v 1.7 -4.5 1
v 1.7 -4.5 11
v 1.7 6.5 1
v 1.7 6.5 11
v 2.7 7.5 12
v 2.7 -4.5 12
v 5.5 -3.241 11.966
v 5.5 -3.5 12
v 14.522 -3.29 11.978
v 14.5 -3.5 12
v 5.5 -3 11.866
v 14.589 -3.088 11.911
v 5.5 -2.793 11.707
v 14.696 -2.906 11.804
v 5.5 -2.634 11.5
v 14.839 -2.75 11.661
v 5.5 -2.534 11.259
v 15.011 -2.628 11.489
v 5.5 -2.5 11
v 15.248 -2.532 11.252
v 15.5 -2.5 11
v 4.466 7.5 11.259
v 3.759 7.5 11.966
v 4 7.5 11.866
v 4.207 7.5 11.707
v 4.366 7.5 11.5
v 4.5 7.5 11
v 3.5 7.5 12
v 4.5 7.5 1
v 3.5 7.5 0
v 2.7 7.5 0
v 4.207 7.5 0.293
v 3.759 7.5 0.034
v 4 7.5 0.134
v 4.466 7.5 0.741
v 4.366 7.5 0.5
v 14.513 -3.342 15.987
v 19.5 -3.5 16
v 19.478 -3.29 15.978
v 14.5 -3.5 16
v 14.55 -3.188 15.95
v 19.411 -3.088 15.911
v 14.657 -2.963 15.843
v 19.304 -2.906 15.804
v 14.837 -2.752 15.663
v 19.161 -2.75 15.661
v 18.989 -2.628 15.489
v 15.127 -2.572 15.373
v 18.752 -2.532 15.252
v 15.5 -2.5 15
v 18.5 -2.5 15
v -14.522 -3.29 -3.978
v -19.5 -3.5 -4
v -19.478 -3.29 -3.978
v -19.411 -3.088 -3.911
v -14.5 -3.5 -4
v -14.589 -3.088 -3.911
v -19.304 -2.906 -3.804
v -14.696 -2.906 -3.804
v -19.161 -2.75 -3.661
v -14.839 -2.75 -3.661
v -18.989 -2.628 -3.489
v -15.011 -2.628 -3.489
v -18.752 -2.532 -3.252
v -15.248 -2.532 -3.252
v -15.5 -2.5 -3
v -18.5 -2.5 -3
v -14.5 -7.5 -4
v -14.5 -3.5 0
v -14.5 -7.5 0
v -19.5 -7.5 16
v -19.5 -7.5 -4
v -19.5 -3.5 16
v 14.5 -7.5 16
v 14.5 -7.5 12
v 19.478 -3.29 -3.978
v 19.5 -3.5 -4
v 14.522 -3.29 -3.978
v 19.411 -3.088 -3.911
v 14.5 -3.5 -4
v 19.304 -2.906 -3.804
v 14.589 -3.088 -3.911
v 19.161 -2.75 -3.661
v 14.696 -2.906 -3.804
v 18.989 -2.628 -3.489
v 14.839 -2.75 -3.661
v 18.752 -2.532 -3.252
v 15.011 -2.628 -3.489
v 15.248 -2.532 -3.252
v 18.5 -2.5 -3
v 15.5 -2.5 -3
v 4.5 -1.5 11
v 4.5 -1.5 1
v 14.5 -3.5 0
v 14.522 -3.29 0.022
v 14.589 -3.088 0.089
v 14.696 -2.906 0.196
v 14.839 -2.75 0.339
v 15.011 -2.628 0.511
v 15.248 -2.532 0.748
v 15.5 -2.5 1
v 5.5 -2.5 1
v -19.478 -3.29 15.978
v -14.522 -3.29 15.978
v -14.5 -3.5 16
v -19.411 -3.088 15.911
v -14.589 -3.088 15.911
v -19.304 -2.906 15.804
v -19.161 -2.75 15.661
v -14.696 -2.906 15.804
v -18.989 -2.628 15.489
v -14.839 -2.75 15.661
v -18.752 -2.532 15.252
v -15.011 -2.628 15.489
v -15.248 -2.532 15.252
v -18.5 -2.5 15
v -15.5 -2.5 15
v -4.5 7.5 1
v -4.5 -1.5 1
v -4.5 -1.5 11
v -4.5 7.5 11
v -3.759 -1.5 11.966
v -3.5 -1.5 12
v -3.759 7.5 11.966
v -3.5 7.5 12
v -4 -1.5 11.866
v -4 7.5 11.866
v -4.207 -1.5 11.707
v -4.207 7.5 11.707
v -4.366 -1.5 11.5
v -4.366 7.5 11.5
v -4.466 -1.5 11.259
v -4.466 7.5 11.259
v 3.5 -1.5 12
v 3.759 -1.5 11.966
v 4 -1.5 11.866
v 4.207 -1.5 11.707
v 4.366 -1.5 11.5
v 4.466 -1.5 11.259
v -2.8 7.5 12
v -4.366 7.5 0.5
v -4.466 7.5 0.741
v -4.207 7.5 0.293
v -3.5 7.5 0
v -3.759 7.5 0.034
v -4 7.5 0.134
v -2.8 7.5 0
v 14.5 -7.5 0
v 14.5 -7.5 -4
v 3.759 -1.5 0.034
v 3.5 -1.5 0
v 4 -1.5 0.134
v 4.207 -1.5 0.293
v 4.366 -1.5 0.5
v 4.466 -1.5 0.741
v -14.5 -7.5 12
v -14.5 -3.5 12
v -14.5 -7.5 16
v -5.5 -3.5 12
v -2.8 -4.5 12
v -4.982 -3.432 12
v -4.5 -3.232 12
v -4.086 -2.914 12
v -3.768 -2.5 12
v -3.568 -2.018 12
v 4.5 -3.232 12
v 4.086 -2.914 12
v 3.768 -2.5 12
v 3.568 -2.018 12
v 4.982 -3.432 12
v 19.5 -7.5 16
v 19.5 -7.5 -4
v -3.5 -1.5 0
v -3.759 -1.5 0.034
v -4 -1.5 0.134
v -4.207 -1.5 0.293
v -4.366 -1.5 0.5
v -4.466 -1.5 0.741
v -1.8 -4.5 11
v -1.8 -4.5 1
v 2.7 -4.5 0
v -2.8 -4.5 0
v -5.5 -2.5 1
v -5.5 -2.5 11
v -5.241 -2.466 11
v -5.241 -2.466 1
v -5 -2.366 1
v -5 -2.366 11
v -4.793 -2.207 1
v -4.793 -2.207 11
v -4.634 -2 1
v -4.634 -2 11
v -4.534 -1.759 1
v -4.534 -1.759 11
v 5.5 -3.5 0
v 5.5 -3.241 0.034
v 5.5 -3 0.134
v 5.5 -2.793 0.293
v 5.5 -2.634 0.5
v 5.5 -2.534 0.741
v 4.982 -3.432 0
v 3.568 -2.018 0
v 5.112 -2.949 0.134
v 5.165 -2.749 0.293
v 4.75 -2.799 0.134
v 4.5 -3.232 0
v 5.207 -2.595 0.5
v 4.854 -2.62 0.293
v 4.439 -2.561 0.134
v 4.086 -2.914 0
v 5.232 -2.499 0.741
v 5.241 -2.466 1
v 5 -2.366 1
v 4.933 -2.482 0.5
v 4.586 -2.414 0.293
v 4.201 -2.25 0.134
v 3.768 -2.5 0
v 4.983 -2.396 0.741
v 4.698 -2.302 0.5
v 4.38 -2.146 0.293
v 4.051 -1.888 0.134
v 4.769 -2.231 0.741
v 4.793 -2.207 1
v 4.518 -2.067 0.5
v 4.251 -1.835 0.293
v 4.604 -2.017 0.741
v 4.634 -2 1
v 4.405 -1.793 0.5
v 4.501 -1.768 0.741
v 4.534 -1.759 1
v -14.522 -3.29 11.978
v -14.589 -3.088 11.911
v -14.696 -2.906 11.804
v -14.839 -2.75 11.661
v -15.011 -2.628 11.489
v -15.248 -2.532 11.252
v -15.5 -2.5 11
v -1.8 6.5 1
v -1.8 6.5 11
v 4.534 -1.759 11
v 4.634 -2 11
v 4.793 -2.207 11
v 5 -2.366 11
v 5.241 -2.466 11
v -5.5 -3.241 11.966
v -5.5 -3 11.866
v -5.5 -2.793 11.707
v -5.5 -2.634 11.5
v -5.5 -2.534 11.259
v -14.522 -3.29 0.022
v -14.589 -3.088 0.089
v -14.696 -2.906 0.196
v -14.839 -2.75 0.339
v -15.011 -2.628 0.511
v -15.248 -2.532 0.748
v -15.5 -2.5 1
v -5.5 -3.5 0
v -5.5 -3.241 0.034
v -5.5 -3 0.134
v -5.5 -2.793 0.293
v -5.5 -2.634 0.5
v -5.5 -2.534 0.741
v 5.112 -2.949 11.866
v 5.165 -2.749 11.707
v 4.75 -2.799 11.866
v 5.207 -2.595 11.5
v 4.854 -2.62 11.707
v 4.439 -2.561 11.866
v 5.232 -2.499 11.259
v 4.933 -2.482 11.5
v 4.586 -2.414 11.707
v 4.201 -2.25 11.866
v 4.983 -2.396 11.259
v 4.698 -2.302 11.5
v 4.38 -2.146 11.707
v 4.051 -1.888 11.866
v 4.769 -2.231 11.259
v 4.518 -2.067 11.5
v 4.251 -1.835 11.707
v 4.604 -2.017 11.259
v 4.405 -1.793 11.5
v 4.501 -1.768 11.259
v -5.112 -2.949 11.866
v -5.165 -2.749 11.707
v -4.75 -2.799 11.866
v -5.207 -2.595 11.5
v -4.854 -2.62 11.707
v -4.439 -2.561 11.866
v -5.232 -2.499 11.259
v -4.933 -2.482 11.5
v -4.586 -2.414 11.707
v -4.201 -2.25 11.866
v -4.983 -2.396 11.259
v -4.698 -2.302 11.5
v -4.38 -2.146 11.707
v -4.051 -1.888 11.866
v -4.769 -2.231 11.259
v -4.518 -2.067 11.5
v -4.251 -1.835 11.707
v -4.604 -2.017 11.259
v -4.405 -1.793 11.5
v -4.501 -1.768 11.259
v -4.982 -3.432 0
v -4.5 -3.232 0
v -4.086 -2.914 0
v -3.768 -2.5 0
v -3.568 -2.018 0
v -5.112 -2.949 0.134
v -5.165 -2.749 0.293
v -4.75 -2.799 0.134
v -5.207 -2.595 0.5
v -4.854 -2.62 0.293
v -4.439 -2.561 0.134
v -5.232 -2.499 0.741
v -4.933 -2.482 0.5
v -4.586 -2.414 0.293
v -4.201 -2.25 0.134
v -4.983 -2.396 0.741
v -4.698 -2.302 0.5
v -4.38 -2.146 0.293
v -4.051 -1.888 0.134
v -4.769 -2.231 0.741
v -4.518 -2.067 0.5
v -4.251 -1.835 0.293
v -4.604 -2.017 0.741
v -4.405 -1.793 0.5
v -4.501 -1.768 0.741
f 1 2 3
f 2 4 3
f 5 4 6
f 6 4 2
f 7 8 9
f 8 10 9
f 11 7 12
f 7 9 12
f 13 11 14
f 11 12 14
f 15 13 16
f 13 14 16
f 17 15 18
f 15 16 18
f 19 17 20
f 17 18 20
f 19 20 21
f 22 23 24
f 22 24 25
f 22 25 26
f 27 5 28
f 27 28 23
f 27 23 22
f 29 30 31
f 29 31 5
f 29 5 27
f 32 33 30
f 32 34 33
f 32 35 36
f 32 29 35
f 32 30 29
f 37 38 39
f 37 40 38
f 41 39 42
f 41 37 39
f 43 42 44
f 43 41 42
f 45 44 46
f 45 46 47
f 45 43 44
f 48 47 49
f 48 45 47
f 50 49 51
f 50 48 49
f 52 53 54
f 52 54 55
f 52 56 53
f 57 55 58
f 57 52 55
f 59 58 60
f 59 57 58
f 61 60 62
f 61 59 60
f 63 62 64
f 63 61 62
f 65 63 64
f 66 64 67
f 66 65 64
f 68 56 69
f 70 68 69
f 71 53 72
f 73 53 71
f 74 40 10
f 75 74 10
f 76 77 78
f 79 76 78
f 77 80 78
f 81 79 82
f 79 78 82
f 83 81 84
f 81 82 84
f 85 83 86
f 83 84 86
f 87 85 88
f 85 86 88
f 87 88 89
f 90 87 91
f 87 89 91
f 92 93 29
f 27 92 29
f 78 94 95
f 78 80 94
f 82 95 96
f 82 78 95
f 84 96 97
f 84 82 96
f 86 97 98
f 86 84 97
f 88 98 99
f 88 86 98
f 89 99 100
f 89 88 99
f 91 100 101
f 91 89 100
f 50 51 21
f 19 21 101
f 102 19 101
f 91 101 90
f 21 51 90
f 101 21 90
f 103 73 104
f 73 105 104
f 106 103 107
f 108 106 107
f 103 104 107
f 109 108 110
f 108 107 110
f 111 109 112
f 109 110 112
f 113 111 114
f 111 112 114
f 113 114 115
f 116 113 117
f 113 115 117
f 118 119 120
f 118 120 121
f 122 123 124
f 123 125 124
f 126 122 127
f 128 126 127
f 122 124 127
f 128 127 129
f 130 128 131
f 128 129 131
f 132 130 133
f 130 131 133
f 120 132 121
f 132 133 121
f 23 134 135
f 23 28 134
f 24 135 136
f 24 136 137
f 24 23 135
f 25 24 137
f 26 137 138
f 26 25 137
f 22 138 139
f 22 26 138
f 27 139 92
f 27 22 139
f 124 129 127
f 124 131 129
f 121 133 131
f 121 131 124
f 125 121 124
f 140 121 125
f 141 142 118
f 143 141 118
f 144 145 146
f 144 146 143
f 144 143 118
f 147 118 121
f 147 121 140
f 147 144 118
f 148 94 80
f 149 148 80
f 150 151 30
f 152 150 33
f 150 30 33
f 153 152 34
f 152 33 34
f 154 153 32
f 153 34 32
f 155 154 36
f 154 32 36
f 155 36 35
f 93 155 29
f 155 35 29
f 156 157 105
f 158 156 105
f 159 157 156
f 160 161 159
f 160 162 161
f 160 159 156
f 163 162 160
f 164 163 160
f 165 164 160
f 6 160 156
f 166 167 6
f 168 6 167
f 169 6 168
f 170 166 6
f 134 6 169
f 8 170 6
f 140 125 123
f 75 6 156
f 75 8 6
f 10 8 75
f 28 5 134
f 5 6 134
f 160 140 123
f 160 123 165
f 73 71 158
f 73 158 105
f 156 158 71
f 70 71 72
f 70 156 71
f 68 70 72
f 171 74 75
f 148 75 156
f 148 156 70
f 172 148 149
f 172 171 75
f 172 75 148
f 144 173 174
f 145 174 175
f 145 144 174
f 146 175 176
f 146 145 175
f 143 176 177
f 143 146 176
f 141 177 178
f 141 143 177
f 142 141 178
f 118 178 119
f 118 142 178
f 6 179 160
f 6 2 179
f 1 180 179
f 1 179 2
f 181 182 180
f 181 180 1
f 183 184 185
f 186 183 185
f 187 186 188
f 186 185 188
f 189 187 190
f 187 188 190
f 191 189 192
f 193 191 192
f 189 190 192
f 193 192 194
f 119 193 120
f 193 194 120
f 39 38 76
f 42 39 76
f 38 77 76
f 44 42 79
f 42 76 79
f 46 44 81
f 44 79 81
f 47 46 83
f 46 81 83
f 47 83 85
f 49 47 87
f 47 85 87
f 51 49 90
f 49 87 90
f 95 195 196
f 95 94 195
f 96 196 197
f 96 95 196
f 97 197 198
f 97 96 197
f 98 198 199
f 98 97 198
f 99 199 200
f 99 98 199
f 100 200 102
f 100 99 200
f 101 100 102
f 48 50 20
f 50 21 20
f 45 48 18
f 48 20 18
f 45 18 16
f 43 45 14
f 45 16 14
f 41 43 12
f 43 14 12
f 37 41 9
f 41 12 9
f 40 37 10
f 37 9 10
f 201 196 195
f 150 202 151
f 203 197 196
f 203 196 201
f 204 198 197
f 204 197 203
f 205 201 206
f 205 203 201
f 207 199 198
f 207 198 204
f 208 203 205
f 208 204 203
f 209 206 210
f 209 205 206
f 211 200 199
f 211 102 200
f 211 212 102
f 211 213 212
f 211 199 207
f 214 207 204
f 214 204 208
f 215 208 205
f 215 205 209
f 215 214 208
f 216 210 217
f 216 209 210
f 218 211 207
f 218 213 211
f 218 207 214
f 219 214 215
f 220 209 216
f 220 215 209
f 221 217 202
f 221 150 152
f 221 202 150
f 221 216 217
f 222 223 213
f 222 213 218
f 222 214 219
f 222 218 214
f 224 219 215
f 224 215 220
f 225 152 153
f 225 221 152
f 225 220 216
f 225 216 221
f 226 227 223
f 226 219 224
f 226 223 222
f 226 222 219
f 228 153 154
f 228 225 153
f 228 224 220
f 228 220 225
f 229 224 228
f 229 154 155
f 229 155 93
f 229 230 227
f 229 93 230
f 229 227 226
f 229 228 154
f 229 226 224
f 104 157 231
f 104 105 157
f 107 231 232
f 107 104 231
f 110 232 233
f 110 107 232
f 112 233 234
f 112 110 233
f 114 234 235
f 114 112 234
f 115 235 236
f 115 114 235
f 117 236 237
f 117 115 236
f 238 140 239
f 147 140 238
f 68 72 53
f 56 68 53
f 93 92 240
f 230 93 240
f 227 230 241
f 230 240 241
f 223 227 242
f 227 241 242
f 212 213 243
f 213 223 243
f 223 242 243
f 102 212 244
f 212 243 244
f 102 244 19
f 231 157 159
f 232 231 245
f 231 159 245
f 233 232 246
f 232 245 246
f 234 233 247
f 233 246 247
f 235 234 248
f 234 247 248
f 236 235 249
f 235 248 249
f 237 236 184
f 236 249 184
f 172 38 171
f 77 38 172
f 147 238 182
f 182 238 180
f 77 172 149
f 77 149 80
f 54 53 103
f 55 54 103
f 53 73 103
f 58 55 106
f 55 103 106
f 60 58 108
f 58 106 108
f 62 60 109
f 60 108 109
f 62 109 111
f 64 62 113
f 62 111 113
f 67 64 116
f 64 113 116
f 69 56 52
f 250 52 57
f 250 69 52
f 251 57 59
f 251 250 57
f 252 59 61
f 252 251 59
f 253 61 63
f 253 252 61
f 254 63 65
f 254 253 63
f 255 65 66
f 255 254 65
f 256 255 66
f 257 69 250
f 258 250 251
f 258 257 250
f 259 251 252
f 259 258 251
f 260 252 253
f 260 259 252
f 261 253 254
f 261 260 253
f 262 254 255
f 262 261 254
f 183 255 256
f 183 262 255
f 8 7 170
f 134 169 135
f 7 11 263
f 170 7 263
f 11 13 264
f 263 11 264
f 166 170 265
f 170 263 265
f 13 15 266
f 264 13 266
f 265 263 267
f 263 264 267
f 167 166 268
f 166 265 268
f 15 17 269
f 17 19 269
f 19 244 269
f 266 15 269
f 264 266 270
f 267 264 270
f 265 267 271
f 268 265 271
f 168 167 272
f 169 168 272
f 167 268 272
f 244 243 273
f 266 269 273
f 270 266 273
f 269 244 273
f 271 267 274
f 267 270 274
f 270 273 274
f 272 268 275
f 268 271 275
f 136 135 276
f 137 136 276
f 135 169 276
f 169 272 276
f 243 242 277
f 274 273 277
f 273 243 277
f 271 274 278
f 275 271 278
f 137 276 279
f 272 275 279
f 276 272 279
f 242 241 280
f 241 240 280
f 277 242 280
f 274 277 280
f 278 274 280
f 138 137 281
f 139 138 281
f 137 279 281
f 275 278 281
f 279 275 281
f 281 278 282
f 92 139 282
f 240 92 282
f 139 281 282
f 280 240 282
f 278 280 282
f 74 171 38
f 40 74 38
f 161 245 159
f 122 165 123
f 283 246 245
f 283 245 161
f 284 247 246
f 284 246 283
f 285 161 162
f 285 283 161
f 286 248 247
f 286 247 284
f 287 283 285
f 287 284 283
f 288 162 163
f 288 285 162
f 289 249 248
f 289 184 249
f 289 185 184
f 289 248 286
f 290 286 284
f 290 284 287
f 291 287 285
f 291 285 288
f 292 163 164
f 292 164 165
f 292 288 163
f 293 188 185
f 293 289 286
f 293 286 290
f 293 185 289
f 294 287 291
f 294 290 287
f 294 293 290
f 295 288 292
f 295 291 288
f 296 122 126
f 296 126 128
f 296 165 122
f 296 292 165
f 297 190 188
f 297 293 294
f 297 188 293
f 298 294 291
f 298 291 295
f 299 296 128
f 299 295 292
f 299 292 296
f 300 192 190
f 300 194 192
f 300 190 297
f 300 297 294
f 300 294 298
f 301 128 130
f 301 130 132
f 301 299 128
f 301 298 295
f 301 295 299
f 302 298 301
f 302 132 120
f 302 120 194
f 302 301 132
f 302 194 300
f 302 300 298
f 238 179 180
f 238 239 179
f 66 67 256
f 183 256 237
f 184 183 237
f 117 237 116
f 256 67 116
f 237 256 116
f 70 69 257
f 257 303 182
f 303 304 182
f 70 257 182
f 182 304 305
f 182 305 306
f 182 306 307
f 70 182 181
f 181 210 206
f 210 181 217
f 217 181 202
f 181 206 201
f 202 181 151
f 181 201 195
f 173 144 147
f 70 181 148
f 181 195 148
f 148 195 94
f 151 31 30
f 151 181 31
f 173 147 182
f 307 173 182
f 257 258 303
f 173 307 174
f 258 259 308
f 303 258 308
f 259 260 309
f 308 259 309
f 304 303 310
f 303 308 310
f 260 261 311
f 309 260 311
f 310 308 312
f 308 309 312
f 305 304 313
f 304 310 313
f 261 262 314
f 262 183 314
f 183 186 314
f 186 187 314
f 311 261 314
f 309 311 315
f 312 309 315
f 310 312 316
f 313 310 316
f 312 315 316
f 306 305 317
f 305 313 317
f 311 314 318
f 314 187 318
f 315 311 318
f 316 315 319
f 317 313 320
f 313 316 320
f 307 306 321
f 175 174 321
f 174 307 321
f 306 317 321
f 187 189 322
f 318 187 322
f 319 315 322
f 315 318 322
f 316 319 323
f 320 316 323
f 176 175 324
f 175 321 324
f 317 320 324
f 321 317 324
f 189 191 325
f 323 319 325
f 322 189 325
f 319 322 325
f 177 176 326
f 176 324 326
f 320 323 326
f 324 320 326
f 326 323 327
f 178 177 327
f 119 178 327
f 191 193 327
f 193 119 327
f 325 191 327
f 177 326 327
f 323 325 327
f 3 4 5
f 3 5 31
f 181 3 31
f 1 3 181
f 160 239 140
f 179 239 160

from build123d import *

# Parameters (mm, degrees)
SKETCH1_W           = 9
SKETCH1_H           = 15
SKETCH1_W_2         = 15
SKETCH1_H_2         = 5
BOSS_EXTRUDE1_DEPTH = 12
SKETCH2_W           = 3.5
SKETCH2_H           = 12
CUT_EXTRUDE1_DEPTH  = 12
SKETCH3_W           = 20
SKETCH3_H           = 5
BOSS_EXTRUDE2_DEPTH = 5
SKETCH4_W           = 20
SKETCH4_H           = 5
BOSS_EXTRUDE3_DEPTH = 5
CHAMFER1_SIZE       = 1
FILLET1_R           = 1


with BuildPart() as part:
    # Sketch1 → Boss-Extrude1 (new body)
    with BuildSketch(Plane.XY):
        Rectangle(SKETCH1_W, SKETCH1_H)
        with Locations((-12, -5)):
            Rectangle(SKETCH1_W_2, SKETCH1_H_2)
        with Locations((12, -5)):
            Rectangle(SKETCH1_W_2, SKETCH1_H_2)
    extrude(amount=BOSS_EXTRUDE1_DEPTH)

    # Sketch2 → Cut-Extrude1 (cut)
    with BuildSketch(Plane(origin=(0, 7.5, 0), x_dir=(1, 0, 0), z_dir=(0, 1, 0))):
        with Locations((-0.05, -6)):
            Rectangle(SKETCH2_W, SKETCH2_H)
    extrude(amount=-CUT_EXTRUDE1_DEPTH, mode=Mode.SUBTRACT)

    # Sketch3 → Boss-Extrude2 (add)
    with BuildSketch(Plane.ZY.offset(19.5)):
        with Locations((6, -5)):
            Rectangle(SKETCH3_W, SKETCH3_H)
    extrude(amount=-BOSS_EXTRUDE2_DEPTH)

    # Sketch4 → Boss-Extrude3 (add)
    with BuildSketch(Plane(origin=(19.5, 0, 0), x_dir=(0, 0, -1), z_dir=(1, 0, 0))):
        with Locations((-6, -5)):
            Rectangle(SKETCH4_W, SKETCH4_H)
    extrude(amount=-BOSS_EXTRUDE3_DEPTH)

    # Chamfer1
    chamfer1_edges = [part.edges().sort_by_distance(p)[0] for p in [
        (-1.8, 1.5, 12),
        (-1.8, 1.5, 0),
        (1.7, 1.5, 0),
        (1.7, 1.5, 12),
        (-1.8, 7.5, 6),
        (1.7, 7.5, 6),
    ]]
    chamfer(chamfer1_edges, length=CHAMFER1_SIZE)

    # Fillet1
    fillet1_edges = [part.edges().sort_by_distance(p)[0] for p in [
        (9.5, -2.5, 0),
        (-9.5, -2.5, 0),
        (-4.5, 2.5, 0),
        (4.5, 2.5, 0),
        (-4.5, 2.5, 12),
        (4.5, -2.5, 6),
        (19.5, -2.5, 6),
        (-19.5, -2.5, 6),
        (-4.5, -2.5, 6),
        (-9.5, -2.5, 12),
        (9.5, -2.5, 12),
        (-14.5, -2.5, -2),
        (4.5, 2.5, 12),
        (-17, -2.5, -4),
        (-14.5, -2.5, 14),
        (-17, -2.5, 16),
        (14.5, -2.5, -2),
        (14.5, -2.5, 14),
        (17, -2.5, 16),
        (17, -2.5, -4),
    ]]
    fillet(fillet1_edges, radius=FILLET1_R)


solid = part.part
